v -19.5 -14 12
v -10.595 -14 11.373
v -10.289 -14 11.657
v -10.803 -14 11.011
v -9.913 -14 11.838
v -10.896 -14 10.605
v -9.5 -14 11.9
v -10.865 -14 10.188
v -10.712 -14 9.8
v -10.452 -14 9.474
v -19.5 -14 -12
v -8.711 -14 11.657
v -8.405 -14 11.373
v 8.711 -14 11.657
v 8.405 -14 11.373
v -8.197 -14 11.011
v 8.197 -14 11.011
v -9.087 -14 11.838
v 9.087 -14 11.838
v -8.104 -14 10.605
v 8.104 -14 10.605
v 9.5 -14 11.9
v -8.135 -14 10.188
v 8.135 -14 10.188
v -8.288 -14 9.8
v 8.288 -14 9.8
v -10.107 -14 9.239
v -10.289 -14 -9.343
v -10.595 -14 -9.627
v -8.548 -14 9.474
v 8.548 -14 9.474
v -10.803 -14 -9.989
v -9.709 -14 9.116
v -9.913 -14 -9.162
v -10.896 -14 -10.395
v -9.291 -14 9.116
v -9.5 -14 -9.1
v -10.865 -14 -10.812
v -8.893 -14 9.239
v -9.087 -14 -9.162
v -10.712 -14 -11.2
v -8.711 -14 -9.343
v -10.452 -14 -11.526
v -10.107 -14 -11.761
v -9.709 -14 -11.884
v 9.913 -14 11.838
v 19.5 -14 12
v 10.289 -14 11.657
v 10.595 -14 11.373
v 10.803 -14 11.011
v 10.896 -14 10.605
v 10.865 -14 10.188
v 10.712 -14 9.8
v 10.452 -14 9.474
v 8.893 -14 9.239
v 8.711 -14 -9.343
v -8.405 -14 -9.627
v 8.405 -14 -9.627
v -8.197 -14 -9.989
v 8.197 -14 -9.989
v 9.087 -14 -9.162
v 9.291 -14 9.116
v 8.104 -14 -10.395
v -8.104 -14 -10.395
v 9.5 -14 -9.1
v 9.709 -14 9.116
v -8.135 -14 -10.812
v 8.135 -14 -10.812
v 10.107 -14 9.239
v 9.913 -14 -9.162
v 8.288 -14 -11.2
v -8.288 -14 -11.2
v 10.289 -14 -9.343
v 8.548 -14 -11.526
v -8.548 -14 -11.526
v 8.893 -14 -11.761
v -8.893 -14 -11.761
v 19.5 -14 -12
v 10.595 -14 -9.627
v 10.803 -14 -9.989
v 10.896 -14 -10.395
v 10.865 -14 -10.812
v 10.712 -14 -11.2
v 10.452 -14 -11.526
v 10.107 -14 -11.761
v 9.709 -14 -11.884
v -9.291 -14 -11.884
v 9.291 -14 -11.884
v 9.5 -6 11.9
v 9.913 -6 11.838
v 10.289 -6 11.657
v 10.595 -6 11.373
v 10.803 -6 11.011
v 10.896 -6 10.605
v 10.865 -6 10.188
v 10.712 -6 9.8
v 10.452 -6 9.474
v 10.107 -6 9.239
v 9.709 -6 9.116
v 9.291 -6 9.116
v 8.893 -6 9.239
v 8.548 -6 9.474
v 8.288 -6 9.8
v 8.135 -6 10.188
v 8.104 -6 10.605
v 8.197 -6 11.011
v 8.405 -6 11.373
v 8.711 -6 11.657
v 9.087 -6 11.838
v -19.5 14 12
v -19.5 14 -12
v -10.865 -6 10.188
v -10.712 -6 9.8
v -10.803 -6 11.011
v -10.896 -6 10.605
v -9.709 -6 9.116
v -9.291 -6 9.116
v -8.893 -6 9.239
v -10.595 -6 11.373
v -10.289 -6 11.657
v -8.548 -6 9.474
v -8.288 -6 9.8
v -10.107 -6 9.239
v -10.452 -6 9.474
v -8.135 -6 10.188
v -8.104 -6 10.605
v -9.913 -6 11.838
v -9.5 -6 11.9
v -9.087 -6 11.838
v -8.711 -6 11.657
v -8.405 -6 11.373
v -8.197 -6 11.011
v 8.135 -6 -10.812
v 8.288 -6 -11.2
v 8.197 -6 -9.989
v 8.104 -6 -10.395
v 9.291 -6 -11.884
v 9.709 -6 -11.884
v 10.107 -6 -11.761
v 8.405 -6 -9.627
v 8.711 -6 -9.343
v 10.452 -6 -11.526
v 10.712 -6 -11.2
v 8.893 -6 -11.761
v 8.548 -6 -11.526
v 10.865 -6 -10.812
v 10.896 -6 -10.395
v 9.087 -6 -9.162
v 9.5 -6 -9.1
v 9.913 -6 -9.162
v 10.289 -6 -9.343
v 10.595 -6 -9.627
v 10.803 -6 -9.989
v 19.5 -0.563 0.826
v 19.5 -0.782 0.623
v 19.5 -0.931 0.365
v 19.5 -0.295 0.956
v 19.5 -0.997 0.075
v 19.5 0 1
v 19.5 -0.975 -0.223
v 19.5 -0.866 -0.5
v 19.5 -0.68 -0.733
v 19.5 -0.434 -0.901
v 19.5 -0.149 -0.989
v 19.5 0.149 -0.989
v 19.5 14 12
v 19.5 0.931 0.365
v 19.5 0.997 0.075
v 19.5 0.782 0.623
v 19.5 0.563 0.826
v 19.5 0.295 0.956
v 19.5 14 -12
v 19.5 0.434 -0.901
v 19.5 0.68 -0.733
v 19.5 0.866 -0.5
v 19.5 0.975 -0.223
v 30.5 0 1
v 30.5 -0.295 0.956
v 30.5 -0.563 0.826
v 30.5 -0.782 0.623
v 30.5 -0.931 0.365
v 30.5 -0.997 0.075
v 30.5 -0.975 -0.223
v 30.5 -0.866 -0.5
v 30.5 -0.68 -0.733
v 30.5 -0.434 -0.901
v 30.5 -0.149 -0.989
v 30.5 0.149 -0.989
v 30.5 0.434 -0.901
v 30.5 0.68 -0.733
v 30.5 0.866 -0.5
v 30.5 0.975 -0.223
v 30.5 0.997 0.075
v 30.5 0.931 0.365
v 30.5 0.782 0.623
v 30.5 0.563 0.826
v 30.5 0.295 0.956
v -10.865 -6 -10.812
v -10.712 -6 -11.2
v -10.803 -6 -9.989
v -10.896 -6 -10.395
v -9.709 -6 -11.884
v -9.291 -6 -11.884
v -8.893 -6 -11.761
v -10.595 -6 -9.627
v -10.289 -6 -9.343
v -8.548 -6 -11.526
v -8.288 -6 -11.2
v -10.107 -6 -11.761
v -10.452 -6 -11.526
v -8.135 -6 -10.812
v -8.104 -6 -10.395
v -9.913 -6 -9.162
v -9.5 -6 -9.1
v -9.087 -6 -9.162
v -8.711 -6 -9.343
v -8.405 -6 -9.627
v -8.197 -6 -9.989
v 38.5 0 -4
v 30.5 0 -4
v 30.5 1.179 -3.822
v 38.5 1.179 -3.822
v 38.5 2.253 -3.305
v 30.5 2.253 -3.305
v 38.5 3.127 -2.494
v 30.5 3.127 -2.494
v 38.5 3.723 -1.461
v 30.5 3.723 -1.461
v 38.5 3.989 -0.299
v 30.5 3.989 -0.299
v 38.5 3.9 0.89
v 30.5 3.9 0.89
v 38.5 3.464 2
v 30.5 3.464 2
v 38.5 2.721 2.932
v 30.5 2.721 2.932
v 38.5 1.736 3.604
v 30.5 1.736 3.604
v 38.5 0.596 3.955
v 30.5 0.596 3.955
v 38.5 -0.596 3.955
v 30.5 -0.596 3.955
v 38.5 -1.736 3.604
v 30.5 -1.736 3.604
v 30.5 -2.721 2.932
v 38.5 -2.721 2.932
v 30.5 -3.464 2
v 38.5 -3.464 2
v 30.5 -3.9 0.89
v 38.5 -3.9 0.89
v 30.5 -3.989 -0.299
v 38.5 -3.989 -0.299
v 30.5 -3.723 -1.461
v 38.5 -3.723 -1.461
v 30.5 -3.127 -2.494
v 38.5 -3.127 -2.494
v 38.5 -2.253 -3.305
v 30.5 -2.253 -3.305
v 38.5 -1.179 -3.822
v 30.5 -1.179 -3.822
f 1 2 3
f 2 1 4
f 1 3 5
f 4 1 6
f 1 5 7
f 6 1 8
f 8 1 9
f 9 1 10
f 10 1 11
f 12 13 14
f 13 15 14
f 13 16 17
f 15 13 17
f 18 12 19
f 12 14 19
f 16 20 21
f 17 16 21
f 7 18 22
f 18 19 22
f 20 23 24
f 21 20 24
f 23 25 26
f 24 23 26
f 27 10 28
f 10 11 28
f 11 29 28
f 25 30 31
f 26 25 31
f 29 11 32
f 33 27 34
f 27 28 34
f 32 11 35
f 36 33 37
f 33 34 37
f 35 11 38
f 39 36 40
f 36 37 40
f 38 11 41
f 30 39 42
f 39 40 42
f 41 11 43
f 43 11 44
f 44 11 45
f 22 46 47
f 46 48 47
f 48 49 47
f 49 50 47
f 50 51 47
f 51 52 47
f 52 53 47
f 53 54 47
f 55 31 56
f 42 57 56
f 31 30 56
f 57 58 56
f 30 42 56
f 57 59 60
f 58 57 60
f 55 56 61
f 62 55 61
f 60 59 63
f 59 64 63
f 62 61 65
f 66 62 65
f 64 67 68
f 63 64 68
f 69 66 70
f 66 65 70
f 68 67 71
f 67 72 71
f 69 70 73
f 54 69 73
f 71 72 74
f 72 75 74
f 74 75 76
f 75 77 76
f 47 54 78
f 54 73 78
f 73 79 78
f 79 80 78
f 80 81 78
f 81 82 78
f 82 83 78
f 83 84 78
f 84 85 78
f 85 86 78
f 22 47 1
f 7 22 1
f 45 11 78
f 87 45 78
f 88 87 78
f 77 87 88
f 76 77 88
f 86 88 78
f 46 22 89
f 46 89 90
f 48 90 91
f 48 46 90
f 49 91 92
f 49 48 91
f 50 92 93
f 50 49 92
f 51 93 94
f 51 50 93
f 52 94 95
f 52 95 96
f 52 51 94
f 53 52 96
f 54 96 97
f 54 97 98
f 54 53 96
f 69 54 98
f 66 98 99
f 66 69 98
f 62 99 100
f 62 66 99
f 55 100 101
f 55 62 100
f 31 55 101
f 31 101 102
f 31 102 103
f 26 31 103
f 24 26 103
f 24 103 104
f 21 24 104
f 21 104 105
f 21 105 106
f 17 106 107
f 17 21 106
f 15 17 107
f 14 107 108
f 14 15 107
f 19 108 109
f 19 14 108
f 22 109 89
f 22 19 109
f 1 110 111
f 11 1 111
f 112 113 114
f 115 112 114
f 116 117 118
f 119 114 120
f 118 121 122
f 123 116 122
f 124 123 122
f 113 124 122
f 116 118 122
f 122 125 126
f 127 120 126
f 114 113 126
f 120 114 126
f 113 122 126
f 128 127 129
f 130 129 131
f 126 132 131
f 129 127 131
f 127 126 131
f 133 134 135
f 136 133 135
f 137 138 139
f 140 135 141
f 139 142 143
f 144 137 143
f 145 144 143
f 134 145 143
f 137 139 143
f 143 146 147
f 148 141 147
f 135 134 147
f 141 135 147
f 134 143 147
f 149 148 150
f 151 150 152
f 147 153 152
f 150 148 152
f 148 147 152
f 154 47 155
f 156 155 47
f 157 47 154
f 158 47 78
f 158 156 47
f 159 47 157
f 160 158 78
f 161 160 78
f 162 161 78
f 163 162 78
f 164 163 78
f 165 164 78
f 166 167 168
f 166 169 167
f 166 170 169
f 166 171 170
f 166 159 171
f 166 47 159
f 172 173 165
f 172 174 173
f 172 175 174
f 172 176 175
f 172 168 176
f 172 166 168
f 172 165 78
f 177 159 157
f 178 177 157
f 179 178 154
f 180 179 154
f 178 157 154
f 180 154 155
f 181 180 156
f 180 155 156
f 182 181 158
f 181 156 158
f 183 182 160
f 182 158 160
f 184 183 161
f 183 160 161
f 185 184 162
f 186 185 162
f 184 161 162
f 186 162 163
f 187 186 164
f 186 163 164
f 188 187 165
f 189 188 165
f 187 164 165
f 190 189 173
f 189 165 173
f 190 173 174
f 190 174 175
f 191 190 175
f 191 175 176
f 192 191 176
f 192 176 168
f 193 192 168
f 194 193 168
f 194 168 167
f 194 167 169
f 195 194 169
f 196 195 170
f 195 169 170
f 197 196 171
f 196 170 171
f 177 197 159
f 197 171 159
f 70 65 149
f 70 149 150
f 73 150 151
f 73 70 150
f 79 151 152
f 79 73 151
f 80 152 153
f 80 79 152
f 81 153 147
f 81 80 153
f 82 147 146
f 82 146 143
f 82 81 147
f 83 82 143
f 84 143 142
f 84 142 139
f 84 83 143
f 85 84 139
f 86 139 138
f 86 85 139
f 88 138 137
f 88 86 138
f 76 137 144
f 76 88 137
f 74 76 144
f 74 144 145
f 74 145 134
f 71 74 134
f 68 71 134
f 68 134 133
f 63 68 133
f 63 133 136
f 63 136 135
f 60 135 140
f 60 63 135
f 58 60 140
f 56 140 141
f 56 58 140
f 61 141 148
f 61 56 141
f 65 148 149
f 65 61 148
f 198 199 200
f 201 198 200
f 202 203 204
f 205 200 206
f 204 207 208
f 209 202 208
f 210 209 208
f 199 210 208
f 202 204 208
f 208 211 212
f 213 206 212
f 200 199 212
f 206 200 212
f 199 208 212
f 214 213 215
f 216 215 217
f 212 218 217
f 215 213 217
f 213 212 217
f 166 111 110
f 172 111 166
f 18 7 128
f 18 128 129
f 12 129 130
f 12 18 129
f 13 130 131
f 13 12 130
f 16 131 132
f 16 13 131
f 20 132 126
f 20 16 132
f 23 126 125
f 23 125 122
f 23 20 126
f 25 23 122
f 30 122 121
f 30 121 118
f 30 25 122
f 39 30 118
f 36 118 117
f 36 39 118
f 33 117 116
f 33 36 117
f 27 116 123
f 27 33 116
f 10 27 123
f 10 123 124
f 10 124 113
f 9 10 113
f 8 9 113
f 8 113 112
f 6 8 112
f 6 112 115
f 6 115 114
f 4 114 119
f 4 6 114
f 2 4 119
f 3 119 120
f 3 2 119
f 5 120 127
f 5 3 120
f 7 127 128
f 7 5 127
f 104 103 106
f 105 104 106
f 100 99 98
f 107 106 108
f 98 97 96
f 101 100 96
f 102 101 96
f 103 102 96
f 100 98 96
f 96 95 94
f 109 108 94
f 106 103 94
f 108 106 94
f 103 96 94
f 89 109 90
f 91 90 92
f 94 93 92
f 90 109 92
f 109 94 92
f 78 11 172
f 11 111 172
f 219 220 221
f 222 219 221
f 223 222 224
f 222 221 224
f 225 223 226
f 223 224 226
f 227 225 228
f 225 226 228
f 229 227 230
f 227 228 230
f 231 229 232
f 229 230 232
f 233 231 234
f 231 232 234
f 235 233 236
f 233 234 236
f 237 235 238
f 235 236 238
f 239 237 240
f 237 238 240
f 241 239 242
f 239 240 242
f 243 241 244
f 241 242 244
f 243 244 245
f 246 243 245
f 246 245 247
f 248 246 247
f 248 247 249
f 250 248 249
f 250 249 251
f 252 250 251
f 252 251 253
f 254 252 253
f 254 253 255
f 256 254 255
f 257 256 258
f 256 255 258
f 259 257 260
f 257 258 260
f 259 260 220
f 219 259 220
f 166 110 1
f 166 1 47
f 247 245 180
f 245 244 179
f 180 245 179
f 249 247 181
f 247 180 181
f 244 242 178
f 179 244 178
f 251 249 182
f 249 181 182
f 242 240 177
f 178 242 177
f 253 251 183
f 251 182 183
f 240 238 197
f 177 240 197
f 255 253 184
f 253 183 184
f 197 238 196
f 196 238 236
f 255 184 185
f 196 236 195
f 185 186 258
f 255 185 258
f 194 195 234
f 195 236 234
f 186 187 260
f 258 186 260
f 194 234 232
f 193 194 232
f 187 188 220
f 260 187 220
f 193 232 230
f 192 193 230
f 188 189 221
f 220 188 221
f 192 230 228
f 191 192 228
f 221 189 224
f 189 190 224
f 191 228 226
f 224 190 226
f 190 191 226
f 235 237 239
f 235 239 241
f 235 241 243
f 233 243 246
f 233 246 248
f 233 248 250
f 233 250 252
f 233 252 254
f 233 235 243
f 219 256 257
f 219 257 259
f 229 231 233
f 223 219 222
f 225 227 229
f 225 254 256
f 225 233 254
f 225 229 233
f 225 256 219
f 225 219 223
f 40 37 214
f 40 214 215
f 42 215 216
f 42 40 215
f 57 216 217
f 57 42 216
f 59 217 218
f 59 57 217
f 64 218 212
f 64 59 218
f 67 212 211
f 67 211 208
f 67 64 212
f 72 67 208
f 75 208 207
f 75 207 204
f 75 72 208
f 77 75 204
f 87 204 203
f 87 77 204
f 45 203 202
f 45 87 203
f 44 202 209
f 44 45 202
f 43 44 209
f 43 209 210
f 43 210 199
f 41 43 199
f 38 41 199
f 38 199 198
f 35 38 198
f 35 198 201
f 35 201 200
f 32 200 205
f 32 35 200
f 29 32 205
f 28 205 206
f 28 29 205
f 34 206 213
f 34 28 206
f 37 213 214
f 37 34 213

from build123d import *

# Parameters (mm, degrees)
SKETCH2_W           = 39
SKETCH2_H           = 24
BOSS_EXTRUDE1_DEPTH = 14
SKETCH3_R           = 1
BOSS_EXTRUDE2_DEPTH = 11
SKETCH4_R           = 4
BOSS_EXTRUDE3_DEPTH = 8
SKETCH5_R           = 1.4
CUT_EXTRUDE3_DEPTH  = 8


with BuildPart() as part:
    # Sketch2 → Boss-Extrude1 (new, symmetric)
    with BuildSketch(Plane(origin=(0, 0, 0), x_dir=(1, 0, 0), z_dir=(0, 1, 0))):
        Rectangle(SKETCH2_W, SKETCH2_H)
    extrude(amount=BOSS_EXTRUDE1_DEPTH, both=True)

    # Sketch3 → Boss-Extrude2 (add)
    with BuildSketch(Plane(origin=(19.5, 0, 0), x_dir=(0, 0, -1), z_dir=(1, 0, 0))):
        with Locations(Location((0, 0, 0), (0, 0, 180))):
            Circle(SKETCH3_R)
    extrude(amount=BOSS_EXTRUDE2_DEPTH)

    # Sketch4 → Boss-Extrude3 (add)
    with BuildSketch(Plane(origin=(30.5, 0, 0), x_dir=(0, 0, -1), z_dir=(1, 0, 0))):
        Circle(SKETCH4_R)
    extrude(amount=BOSS_EXTRUDE3_DEPTH)

    # Sketch5 → Cut-Extrude3 (cut)
    with BuildSketch(Plane(origin=(0, -14, 0), x_dir=(1, 0, 0), z_dir=(0, 1, 0))):
        with Locations(Location((-9.5, 10.5, 0), (0, 0, 270))):
            Circle(SKETCH5_R)
        with Locations(Location((-9.5, -10.5, 0), (0, 0, 270))):
            Circle(SKETCH5_R)
        with Locations(Location((9.5, 10.5, 0), (0, 0, 270))):
            Circle(SKETCH5_R)
        with Locations(Location((9.5, -10.5, 0), (0, 0, 270))):
            Circle(SKETCH5_R)
    extrude(amount=CUT_EXTRUDE3_DEPTH, mode=Mode.SUBTRACT)


solid = part.part
